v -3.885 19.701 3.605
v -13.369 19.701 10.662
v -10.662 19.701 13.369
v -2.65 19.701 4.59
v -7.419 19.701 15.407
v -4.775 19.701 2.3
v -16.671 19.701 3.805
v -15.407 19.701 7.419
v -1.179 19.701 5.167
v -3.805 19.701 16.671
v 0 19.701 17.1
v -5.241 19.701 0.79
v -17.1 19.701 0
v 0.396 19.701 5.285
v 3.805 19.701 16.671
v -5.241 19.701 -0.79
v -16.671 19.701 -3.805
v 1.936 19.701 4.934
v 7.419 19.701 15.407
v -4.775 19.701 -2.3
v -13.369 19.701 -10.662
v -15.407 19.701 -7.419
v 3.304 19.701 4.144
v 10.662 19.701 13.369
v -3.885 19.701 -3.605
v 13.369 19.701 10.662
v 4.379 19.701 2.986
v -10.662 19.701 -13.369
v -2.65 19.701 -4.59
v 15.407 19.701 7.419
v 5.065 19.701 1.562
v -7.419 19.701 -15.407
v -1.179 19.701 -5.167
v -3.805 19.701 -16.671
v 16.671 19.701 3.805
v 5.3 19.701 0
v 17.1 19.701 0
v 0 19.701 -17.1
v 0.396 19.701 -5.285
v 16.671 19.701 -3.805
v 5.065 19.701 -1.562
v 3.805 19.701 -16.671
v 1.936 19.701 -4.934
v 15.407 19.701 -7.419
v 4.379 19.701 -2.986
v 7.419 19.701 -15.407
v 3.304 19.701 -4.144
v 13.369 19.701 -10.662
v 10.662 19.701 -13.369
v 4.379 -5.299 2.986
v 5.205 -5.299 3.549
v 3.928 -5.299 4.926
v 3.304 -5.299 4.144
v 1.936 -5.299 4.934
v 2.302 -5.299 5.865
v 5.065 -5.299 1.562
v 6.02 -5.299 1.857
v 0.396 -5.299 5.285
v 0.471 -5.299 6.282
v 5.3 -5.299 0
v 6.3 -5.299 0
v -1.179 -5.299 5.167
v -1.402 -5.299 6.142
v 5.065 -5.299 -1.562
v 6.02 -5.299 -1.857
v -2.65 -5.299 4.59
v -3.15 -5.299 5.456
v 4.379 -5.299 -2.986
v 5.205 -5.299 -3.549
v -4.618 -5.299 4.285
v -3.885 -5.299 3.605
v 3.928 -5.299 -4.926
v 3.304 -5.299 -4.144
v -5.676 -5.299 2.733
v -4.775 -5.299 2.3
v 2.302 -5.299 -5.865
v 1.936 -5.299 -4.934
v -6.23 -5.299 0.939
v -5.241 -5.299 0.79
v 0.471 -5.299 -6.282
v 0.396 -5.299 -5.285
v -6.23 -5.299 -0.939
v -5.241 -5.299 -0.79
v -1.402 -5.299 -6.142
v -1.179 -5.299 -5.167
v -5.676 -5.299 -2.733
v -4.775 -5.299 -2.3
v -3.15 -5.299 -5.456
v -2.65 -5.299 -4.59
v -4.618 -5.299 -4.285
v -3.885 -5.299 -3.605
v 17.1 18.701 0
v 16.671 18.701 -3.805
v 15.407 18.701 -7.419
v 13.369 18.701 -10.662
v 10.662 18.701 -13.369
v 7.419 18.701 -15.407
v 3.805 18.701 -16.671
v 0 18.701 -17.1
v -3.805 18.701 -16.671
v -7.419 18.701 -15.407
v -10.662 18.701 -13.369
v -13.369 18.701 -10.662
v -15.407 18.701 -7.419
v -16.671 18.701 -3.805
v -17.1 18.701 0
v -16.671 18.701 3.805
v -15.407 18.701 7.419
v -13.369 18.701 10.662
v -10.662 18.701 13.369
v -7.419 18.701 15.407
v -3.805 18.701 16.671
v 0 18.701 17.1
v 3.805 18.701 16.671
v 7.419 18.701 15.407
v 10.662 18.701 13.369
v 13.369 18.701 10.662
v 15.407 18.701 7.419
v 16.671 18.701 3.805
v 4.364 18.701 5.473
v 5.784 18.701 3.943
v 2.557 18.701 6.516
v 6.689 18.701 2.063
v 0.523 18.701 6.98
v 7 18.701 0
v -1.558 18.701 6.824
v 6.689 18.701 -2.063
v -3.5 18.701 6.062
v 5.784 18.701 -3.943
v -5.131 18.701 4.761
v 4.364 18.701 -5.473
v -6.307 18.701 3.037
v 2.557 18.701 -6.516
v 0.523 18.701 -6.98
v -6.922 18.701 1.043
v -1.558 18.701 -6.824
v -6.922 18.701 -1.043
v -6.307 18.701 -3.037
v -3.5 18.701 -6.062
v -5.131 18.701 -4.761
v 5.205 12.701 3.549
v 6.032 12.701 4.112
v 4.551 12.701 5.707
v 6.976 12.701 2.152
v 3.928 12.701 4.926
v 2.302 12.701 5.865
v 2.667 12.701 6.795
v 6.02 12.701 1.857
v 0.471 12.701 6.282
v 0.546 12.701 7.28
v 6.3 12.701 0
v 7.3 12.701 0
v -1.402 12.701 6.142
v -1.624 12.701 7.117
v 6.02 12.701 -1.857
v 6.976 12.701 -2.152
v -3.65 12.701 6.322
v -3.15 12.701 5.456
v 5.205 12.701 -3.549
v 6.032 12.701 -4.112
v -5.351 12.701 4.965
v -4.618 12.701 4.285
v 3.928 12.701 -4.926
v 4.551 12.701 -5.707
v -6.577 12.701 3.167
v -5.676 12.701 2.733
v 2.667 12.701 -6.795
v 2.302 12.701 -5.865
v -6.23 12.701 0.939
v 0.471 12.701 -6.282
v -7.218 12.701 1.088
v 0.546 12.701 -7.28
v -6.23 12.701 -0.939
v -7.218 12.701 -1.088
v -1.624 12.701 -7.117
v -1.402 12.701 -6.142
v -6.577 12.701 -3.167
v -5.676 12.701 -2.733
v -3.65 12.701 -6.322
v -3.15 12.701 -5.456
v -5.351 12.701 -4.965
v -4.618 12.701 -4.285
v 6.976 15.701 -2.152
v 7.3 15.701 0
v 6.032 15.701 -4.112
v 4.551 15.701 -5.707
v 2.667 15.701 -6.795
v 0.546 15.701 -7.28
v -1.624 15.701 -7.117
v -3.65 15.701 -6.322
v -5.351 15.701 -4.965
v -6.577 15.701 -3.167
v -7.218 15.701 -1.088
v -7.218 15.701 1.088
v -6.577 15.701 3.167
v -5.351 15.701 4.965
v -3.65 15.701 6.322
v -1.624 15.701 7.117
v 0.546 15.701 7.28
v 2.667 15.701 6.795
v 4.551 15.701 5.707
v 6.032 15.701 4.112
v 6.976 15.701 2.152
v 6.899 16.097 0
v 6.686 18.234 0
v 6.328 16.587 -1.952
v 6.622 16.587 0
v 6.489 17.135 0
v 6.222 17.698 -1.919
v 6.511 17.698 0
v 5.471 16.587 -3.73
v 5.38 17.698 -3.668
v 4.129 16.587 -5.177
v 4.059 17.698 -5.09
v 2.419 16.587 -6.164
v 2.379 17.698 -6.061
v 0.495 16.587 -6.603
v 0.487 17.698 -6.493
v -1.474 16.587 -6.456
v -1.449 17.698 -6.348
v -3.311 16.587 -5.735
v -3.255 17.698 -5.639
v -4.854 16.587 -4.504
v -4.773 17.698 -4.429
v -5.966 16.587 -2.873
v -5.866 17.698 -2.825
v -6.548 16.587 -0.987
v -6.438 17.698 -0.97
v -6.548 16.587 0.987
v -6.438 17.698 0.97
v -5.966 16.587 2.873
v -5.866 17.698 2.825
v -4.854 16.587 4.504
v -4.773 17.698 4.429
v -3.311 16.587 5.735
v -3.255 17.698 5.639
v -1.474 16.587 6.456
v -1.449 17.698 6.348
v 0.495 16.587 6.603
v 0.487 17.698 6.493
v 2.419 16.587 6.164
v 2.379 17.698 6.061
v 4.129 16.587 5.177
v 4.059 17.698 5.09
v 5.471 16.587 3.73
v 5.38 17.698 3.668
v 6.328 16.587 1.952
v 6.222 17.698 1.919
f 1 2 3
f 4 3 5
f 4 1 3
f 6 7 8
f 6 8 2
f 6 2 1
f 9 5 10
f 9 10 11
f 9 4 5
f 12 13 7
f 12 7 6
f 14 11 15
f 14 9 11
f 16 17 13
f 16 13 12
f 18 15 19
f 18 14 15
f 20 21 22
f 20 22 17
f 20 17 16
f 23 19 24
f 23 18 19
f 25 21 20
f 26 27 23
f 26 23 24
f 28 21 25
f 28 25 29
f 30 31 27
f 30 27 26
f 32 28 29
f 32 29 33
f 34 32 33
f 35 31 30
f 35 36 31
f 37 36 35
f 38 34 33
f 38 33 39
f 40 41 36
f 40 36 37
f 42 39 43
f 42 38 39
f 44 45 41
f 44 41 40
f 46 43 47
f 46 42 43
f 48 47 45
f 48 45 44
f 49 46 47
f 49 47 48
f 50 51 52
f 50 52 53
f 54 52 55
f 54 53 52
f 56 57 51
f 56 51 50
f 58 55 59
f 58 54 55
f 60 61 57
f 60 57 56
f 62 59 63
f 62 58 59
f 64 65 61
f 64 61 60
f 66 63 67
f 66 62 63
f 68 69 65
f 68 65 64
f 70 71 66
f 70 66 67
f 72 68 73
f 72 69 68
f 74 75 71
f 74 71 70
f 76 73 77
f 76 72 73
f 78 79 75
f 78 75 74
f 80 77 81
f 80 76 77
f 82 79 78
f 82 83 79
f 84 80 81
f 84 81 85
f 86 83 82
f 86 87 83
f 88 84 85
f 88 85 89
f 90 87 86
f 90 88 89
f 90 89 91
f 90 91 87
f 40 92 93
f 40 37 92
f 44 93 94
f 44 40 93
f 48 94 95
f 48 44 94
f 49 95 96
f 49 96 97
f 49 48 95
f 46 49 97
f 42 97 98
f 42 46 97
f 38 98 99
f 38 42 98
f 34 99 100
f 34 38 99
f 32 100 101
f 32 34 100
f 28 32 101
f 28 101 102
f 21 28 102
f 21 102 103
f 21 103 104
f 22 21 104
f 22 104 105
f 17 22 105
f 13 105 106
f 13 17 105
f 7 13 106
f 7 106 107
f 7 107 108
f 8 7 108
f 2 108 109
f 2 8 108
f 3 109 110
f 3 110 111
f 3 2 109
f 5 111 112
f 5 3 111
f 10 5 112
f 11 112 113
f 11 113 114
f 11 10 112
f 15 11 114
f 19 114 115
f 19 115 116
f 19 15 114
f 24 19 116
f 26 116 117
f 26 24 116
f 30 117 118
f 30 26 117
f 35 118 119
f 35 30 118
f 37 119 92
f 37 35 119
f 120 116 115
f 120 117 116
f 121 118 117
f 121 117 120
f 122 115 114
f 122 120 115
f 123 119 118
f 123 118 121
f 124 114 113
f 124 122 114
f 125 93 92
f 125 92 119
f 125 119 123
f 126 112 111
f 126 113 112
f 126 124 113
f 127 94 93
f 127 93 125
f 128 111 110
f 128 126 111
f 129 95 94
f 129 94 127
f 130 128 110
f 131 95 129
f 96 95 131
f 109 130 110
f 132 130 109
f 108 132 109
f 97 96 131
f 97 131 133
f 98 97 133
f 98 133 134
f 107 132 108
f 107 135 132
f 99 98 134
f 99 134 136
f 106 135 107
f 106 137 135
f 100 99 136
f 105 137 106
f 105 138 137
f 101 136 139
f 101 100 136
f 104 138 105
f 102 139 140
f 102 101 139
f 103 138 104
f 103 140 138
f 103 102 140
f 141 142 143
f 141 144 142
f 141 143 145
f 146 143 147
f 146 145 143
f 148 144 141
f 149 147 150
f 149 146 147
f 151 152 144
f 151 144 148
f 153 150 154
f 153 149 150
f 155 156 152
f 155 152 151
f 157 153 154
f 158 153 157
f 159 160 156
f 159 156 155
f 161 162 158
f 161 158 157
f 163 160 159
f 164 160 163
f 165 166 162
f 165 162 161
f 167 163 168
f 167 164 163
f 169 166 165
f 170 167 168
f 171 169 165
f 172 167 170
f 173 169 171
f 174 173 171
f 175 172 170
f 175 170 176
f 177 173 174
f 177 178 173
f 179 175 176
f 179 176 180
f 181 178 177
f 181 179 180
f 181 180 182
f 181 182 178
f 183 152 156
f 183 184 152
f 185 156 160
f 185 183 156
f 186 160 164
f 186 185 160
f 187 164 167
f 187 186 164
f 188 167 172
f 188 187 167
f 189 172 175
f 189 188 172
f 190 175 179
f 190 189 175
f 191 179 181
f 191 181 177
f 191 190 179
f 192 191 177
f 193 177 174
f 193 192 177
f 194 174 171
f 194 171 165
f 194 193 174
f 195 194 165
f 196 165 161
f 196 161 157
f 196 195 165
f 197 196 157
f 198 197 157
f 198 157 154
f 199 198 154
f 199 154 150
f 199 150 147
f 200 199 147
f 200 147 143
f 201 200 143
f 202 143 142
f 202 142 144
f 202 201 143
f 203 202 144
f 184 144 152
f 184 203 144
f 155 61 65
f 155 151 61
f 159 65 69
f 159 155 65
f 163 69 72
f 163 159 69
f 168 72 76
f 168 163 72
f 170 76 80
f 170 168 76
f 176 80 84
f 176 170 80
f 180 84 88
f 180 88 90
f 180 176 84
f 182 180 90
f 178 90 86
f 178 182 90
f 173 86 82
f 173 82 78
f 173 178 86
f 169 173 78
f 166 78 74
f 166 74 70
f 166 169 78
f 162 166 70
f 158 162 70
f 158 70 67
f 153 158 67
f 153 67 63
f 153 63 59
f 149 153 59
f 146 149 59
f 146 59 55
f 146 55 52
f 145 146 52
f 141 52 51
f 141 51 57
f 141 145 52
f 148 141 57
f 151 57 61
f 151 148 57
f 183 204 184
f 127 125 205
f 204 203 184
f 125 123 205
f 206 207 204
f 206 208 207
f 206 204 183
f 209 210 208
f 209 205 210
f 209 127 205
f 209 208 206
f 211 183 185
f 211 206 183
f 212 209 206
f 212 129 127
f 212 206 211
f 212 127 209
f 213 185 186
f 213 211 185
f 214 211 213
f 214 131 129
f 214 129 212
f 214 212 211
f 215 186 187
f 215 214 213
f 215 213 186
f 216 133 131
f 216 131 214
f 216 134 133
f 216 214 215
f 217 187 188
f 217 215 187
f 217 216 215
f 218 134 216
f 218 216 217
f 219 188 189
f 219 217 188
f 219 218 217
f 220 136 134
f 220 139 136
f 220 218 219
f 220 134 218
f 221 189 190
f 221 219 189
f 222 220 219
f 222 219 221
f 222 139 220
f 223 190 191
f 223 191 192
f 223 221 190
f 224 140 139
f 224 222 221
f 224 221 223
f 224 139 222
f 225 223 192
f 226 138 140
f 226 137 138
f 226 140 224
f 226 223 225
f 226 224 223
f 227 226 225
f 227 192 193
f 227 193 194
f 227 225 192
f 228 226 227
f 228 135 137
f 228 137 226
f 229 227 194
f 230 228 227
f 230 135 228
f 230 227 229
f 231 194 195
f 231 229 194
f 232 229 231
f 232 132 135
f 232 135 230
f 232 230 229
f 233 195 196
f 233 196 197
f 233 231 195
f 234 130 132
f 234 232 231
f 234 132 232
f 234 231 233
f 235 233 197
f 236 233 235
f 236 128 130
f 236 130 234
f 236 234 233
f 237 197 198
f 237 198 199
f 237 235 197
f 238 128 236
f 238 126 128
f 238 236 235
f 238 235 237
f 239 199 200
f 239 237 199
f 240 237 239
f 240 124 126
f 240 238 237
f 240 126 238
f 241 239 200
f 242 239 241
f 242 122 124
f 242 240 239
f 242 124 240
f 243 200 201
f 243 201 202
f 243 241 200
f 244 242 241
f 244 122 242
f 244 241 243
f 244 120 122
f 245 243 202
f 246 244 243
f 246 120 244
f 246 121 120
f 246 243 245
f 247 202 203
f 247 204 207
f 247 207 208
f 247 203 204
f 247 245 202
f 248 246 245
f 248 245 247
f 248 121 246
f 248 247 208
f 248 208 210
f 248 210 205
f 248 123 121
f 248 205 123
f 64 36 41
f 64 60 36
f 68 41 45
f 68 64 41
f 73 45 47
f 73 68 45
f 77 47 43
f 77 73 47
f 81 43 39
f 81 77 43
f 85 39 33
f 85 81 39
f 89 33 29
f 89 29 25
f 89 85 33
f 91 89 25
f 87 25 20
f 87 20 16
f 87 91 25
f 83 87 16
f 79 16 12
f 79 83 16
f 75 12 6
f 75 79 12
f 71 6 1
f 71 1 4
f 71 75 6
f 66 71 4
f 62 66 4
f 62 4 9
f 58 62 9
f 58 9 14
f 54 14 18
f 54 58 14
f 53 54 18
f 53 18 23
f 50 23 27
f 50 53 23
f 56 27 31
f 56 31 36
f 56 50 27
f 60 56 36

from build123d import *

# Parameters (mm, degrees)
F1_W   = 1
F1_H   = 1
F1_H_2 = 3


with BuildPart() as f2:
    # F1 (on Top) → F2 (revolve)
    with BuildSketch(Plane.XY):
        with Locations((5.8, 19.201042)):
            Rectangle(F1_W, F1_H)
        Polygon((5.3, 18.701042), (5.3, -5.298958), (6.3, -5.298958), (6.3, 12.701042), (6.3, 15.701042), (6.3, 18.701042), align=None)
        Polygon((6.3, 19.701042), (6.3, 18.701042), (7, 18.701042), (17.1, 18.701042), (17.1, 19.701042), align=None)
        with BuildLine():
            Line((7, 18.701042), (6.3, 18.701042))
            Line((6.3, 18.701042), (6.3, 15.701042))
            Line((6.3, 15.701042), (7.3, 15.701042))
            ThreePointArc((7.3, 15.701042), (6.489082, 17.13495), (7, 18.701042))
        make_face()
        with Locations((6.8, 14.201042)):
            Rectangle(F1_W, F1_H_2)
    revolve(axis=Axis((0, 5.007949, 0), (0, 1, 0)))


solid = f2.part
